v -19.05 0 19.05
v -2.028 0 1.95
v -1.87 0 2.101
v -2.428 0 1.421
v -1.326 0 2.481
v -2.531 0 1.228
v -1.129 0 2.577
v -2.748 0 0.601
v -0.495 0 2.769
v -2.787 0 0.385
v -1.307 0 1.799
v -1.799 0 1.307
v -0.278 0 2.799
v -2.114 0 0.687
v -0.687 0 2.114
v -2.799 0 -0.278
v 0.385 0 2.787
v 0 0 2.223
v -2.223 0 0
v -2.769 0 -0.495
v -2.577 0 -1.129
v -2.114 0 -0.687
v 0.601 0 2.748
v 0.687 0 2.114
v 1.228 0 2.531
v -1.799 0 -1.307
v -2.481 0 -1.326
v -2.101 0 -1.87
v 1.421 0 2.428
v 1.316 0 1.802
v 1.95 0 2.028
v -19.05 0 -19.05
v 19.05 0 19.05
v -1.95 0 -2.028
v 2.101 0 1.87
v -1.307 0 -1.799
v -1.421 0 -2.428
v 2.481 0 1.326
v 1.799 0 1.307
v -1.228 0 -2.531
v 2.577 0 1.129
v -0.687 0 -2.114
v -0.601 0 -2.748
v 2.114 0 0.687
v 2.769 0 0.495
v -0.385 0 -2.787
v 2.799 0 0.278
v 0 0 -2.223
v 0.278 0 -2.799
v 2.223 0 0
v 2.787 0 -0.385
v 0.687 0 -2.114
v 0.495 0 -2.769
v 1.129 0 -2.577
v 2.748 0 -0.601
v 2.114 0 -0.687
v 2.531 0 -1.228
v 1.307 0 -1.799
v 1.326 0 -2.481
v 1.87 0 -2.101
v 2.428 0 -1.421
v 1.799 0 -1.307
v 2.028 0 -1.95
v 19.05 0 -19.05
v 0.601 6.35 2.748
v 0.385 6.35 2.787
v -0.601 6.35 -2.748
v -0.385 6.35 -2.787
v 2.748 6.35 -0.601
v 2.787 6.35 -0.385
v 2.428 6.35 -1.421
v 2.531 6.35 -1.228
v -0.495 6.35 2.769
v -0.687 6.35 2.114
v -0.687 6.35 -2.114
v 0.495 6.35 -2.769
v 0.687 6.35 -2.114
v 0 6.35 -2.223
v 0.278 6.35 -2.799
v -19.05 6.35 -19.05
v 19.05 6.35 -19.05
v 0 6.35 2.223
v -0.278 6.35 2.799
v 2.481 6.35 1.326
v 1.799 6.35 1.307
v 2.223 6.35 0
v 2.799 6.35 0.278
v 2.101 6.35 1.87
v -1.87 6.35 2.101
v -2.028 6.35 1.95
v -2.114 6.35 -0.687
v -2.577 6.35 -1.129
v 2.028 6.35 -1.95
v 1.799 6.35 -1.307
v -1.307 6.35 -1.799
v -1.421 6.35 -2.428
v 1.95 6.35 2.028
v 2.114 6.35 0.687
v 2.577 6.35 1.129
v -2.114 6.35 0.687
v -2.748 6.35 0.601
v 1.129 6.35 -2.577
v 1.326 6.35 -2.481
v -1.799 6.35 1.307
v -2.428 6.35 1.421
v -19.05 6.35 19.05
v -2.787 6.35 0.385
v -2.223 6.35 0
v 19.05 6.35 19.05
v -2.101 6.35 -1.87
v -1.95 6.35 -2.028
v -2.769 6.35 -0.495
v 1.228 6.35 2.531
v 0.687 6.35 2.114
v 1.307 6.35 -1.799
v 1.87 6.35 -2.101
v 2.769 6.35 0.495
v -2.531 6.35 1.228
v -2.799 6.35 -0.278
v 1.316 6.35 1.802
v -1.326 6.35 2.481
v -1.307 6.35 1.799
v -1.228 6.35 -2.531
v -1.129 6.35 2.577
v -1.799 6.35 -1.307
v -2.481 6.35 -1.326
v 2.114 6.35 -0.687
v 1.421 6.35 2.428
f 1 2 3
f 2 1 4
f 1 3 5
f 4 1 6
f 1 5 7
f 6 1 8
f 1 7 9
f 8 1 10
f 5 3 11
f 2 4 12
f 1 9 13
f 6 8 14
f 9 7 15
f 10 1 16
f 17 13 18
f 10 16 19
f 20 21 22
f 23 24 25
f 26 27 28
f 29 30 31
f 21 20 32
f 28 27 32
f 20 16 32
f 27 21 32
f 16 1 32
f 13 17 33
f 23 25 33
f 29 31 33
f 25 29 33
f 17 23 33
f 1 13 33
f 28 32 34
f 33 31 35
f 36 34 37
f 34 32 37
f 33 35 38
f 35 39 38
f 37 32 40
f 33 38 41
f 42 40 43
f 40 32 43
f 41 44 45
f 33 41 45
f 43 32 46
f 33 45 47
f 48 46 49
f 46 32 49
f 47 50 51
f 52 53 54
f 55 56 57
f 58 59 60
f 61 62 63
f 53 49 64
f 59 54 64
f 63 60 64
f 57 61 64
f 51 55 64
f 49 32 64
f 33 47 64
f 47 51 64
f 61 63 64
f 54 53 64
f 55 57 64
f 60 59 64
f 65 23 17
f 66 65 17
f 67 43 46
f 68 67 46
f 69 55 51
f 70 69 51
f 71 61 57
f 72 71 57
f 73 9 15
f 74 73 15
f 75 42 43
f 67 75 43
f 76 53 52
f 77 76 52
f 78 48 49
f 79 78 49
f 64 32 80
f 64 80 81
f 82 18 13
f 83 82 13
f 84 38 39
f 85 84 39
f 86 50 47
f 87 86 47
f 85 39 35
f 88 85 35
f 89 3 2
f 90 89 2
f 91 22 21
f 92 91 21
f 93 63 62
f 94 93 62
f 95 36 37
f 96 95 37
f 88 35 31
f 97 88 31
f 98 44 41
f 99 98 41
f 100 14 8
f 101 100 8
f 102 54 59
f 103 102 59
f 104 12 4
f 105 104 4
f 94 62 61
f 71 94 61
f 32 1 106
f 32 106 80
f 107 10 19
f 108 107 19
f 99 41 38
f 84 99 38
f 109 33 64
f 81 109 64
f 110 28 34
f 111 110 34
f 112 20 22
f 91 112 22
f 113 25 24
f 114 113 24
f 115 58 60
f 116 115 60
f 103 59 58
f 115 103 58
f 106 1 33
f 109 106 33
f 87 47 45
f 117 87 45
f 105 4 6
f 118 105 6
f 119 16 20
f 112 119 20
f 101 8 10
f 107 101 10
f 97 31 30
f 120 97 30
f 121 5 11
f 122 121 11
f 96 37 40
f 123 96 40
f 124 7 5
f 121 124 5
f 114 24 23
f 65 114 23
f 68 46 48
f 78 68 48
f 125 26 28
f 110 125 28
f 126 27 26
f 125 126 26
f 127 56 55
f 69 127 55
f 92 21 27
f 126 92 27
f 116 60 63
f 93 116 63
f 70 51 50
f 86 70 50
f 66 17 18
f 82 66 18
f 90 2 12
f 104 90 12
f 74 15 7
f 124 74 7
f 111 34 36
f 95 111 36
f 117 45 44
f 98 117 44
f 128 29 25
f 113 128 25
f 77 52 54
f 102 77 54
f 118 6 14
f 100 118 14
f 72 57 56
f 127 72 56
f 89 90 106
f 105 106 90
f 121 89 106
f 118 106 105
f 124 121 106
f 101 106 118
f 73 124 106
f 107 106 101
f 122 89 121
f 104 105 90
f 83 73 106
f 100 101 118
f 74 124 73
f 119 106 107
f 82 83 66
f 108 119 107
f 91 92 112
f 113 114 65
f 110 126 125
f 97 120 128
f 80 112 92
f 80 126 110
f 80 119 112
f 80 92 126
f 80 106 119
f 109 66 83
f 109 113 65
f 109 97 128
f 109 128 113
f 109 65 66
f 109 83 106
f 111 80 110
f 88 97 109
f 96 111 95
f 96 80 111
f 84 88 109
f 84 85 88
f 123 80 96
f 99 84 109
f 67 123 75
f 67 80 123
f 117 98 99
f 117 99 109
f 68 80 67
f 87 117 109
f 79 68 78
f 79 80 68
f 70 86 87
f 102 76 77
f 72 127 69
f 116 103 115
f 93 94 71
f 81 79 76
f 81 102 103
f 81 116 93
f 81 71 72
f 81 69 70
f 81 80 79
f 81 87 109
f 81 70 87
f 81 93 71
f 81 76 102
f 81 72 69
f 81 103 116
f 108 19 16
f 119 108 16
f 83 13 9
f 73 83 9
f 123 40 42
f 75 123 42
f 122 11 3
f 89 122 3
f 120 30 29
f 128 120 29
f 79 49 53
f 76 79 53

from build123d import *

# Parameters (mm, degrees)
SKETCH4_W           = 38.1
SKETCH4_H           = 38.1
BOSS_EXTRUDE2_DEPTH = 6.35


with BuildPart() as part:
    # Sketch4 → Boss-Extrude2 (new body)
    with BuildSketch(Plane(origin=(0, 0, 0), x_dir=(1, 0, 0), z_dir=(0, 1, 0))):
        Rectangle(SKETCH4_W, SKETCH4_H)
        Polygon((-1.949674864, 2.027811191), (-1.306816157, 1.798678132), (-1.420768443, 2.4278936), (-1.227622865, 2.531045714), (-0.687033912, 2.114472959), (-0.600970703, 2.748105623), (-0.385402586, 2.786523847), (0, 2.223288441), (0.277654237, 2.799313921), (0.494543583, 2.769237611), (0.687033912, 2.114472959), (1.129100445, 2.576505868), (1.326080381, 2.480879103), (1.306816157, 1.798678132), (1.870022435, 2.101491469), (2.027811191, 1.949674864), (1.798678132, 1.306816157), (2.4278936, 1.420768443), (2.531045714, 1.227622865), (2.114472959, 0.687033912), (2.748105623, 0.600970703), (2.786523847, 0.385402586), (2.223288441, 0), (2.799313921, -0.277654237), (2.769237611, -0.494543583), (2.114472959, -0.687033912), (2.576505868, -1.129100445), (2.480879103, -1.326080381), (1.798678132, -1.306816157), (2.101491469, -1.870022435), (1.949674864, -2.027811191), (1.316448269, -1.80211129), (1.420768443, -2.4278936), (1.227622865, -2.531045714), (0.687033912, -2.114472959), (0.600970703, -2.748105623), (0.385402586, -2.786523847), (0, -2.223288441), (-0.277654237, -2.799313921), (-0.494543583, -2.769237611), (-0.687033912, -2.114472959), (-1.129100445, -2.576505868), (-1.326080381, -2.480879103), (-1.306816157, -1.798678132), (-1.870022435, -2.101491469), (-2.027811191, -1.949674864), (-1.798678132, -1.306816157), (-2.4278936, -1.420768443), (-2.531045714, -1.227622865), (-2.114472959, -0.687033912), (-2.748105623, -0.600970703), (-2.786523847, -0.385402586), (-2.223288441, 0), (-2.799313921, 0.277654237), (-2.769237611, 0.494543583), (-2.114472959, 0.687033912), (-2.576505868, 1.129100445), (-2.480879103, 1.326080381), (-1.798678132, 1.306816157), (-2.101491469, 1.870022435), align=None, mode=Mode.SUBTRACT)
    extrude(amount=BOSS_EXTRUDE2_DEPTH)


solid = part.part
